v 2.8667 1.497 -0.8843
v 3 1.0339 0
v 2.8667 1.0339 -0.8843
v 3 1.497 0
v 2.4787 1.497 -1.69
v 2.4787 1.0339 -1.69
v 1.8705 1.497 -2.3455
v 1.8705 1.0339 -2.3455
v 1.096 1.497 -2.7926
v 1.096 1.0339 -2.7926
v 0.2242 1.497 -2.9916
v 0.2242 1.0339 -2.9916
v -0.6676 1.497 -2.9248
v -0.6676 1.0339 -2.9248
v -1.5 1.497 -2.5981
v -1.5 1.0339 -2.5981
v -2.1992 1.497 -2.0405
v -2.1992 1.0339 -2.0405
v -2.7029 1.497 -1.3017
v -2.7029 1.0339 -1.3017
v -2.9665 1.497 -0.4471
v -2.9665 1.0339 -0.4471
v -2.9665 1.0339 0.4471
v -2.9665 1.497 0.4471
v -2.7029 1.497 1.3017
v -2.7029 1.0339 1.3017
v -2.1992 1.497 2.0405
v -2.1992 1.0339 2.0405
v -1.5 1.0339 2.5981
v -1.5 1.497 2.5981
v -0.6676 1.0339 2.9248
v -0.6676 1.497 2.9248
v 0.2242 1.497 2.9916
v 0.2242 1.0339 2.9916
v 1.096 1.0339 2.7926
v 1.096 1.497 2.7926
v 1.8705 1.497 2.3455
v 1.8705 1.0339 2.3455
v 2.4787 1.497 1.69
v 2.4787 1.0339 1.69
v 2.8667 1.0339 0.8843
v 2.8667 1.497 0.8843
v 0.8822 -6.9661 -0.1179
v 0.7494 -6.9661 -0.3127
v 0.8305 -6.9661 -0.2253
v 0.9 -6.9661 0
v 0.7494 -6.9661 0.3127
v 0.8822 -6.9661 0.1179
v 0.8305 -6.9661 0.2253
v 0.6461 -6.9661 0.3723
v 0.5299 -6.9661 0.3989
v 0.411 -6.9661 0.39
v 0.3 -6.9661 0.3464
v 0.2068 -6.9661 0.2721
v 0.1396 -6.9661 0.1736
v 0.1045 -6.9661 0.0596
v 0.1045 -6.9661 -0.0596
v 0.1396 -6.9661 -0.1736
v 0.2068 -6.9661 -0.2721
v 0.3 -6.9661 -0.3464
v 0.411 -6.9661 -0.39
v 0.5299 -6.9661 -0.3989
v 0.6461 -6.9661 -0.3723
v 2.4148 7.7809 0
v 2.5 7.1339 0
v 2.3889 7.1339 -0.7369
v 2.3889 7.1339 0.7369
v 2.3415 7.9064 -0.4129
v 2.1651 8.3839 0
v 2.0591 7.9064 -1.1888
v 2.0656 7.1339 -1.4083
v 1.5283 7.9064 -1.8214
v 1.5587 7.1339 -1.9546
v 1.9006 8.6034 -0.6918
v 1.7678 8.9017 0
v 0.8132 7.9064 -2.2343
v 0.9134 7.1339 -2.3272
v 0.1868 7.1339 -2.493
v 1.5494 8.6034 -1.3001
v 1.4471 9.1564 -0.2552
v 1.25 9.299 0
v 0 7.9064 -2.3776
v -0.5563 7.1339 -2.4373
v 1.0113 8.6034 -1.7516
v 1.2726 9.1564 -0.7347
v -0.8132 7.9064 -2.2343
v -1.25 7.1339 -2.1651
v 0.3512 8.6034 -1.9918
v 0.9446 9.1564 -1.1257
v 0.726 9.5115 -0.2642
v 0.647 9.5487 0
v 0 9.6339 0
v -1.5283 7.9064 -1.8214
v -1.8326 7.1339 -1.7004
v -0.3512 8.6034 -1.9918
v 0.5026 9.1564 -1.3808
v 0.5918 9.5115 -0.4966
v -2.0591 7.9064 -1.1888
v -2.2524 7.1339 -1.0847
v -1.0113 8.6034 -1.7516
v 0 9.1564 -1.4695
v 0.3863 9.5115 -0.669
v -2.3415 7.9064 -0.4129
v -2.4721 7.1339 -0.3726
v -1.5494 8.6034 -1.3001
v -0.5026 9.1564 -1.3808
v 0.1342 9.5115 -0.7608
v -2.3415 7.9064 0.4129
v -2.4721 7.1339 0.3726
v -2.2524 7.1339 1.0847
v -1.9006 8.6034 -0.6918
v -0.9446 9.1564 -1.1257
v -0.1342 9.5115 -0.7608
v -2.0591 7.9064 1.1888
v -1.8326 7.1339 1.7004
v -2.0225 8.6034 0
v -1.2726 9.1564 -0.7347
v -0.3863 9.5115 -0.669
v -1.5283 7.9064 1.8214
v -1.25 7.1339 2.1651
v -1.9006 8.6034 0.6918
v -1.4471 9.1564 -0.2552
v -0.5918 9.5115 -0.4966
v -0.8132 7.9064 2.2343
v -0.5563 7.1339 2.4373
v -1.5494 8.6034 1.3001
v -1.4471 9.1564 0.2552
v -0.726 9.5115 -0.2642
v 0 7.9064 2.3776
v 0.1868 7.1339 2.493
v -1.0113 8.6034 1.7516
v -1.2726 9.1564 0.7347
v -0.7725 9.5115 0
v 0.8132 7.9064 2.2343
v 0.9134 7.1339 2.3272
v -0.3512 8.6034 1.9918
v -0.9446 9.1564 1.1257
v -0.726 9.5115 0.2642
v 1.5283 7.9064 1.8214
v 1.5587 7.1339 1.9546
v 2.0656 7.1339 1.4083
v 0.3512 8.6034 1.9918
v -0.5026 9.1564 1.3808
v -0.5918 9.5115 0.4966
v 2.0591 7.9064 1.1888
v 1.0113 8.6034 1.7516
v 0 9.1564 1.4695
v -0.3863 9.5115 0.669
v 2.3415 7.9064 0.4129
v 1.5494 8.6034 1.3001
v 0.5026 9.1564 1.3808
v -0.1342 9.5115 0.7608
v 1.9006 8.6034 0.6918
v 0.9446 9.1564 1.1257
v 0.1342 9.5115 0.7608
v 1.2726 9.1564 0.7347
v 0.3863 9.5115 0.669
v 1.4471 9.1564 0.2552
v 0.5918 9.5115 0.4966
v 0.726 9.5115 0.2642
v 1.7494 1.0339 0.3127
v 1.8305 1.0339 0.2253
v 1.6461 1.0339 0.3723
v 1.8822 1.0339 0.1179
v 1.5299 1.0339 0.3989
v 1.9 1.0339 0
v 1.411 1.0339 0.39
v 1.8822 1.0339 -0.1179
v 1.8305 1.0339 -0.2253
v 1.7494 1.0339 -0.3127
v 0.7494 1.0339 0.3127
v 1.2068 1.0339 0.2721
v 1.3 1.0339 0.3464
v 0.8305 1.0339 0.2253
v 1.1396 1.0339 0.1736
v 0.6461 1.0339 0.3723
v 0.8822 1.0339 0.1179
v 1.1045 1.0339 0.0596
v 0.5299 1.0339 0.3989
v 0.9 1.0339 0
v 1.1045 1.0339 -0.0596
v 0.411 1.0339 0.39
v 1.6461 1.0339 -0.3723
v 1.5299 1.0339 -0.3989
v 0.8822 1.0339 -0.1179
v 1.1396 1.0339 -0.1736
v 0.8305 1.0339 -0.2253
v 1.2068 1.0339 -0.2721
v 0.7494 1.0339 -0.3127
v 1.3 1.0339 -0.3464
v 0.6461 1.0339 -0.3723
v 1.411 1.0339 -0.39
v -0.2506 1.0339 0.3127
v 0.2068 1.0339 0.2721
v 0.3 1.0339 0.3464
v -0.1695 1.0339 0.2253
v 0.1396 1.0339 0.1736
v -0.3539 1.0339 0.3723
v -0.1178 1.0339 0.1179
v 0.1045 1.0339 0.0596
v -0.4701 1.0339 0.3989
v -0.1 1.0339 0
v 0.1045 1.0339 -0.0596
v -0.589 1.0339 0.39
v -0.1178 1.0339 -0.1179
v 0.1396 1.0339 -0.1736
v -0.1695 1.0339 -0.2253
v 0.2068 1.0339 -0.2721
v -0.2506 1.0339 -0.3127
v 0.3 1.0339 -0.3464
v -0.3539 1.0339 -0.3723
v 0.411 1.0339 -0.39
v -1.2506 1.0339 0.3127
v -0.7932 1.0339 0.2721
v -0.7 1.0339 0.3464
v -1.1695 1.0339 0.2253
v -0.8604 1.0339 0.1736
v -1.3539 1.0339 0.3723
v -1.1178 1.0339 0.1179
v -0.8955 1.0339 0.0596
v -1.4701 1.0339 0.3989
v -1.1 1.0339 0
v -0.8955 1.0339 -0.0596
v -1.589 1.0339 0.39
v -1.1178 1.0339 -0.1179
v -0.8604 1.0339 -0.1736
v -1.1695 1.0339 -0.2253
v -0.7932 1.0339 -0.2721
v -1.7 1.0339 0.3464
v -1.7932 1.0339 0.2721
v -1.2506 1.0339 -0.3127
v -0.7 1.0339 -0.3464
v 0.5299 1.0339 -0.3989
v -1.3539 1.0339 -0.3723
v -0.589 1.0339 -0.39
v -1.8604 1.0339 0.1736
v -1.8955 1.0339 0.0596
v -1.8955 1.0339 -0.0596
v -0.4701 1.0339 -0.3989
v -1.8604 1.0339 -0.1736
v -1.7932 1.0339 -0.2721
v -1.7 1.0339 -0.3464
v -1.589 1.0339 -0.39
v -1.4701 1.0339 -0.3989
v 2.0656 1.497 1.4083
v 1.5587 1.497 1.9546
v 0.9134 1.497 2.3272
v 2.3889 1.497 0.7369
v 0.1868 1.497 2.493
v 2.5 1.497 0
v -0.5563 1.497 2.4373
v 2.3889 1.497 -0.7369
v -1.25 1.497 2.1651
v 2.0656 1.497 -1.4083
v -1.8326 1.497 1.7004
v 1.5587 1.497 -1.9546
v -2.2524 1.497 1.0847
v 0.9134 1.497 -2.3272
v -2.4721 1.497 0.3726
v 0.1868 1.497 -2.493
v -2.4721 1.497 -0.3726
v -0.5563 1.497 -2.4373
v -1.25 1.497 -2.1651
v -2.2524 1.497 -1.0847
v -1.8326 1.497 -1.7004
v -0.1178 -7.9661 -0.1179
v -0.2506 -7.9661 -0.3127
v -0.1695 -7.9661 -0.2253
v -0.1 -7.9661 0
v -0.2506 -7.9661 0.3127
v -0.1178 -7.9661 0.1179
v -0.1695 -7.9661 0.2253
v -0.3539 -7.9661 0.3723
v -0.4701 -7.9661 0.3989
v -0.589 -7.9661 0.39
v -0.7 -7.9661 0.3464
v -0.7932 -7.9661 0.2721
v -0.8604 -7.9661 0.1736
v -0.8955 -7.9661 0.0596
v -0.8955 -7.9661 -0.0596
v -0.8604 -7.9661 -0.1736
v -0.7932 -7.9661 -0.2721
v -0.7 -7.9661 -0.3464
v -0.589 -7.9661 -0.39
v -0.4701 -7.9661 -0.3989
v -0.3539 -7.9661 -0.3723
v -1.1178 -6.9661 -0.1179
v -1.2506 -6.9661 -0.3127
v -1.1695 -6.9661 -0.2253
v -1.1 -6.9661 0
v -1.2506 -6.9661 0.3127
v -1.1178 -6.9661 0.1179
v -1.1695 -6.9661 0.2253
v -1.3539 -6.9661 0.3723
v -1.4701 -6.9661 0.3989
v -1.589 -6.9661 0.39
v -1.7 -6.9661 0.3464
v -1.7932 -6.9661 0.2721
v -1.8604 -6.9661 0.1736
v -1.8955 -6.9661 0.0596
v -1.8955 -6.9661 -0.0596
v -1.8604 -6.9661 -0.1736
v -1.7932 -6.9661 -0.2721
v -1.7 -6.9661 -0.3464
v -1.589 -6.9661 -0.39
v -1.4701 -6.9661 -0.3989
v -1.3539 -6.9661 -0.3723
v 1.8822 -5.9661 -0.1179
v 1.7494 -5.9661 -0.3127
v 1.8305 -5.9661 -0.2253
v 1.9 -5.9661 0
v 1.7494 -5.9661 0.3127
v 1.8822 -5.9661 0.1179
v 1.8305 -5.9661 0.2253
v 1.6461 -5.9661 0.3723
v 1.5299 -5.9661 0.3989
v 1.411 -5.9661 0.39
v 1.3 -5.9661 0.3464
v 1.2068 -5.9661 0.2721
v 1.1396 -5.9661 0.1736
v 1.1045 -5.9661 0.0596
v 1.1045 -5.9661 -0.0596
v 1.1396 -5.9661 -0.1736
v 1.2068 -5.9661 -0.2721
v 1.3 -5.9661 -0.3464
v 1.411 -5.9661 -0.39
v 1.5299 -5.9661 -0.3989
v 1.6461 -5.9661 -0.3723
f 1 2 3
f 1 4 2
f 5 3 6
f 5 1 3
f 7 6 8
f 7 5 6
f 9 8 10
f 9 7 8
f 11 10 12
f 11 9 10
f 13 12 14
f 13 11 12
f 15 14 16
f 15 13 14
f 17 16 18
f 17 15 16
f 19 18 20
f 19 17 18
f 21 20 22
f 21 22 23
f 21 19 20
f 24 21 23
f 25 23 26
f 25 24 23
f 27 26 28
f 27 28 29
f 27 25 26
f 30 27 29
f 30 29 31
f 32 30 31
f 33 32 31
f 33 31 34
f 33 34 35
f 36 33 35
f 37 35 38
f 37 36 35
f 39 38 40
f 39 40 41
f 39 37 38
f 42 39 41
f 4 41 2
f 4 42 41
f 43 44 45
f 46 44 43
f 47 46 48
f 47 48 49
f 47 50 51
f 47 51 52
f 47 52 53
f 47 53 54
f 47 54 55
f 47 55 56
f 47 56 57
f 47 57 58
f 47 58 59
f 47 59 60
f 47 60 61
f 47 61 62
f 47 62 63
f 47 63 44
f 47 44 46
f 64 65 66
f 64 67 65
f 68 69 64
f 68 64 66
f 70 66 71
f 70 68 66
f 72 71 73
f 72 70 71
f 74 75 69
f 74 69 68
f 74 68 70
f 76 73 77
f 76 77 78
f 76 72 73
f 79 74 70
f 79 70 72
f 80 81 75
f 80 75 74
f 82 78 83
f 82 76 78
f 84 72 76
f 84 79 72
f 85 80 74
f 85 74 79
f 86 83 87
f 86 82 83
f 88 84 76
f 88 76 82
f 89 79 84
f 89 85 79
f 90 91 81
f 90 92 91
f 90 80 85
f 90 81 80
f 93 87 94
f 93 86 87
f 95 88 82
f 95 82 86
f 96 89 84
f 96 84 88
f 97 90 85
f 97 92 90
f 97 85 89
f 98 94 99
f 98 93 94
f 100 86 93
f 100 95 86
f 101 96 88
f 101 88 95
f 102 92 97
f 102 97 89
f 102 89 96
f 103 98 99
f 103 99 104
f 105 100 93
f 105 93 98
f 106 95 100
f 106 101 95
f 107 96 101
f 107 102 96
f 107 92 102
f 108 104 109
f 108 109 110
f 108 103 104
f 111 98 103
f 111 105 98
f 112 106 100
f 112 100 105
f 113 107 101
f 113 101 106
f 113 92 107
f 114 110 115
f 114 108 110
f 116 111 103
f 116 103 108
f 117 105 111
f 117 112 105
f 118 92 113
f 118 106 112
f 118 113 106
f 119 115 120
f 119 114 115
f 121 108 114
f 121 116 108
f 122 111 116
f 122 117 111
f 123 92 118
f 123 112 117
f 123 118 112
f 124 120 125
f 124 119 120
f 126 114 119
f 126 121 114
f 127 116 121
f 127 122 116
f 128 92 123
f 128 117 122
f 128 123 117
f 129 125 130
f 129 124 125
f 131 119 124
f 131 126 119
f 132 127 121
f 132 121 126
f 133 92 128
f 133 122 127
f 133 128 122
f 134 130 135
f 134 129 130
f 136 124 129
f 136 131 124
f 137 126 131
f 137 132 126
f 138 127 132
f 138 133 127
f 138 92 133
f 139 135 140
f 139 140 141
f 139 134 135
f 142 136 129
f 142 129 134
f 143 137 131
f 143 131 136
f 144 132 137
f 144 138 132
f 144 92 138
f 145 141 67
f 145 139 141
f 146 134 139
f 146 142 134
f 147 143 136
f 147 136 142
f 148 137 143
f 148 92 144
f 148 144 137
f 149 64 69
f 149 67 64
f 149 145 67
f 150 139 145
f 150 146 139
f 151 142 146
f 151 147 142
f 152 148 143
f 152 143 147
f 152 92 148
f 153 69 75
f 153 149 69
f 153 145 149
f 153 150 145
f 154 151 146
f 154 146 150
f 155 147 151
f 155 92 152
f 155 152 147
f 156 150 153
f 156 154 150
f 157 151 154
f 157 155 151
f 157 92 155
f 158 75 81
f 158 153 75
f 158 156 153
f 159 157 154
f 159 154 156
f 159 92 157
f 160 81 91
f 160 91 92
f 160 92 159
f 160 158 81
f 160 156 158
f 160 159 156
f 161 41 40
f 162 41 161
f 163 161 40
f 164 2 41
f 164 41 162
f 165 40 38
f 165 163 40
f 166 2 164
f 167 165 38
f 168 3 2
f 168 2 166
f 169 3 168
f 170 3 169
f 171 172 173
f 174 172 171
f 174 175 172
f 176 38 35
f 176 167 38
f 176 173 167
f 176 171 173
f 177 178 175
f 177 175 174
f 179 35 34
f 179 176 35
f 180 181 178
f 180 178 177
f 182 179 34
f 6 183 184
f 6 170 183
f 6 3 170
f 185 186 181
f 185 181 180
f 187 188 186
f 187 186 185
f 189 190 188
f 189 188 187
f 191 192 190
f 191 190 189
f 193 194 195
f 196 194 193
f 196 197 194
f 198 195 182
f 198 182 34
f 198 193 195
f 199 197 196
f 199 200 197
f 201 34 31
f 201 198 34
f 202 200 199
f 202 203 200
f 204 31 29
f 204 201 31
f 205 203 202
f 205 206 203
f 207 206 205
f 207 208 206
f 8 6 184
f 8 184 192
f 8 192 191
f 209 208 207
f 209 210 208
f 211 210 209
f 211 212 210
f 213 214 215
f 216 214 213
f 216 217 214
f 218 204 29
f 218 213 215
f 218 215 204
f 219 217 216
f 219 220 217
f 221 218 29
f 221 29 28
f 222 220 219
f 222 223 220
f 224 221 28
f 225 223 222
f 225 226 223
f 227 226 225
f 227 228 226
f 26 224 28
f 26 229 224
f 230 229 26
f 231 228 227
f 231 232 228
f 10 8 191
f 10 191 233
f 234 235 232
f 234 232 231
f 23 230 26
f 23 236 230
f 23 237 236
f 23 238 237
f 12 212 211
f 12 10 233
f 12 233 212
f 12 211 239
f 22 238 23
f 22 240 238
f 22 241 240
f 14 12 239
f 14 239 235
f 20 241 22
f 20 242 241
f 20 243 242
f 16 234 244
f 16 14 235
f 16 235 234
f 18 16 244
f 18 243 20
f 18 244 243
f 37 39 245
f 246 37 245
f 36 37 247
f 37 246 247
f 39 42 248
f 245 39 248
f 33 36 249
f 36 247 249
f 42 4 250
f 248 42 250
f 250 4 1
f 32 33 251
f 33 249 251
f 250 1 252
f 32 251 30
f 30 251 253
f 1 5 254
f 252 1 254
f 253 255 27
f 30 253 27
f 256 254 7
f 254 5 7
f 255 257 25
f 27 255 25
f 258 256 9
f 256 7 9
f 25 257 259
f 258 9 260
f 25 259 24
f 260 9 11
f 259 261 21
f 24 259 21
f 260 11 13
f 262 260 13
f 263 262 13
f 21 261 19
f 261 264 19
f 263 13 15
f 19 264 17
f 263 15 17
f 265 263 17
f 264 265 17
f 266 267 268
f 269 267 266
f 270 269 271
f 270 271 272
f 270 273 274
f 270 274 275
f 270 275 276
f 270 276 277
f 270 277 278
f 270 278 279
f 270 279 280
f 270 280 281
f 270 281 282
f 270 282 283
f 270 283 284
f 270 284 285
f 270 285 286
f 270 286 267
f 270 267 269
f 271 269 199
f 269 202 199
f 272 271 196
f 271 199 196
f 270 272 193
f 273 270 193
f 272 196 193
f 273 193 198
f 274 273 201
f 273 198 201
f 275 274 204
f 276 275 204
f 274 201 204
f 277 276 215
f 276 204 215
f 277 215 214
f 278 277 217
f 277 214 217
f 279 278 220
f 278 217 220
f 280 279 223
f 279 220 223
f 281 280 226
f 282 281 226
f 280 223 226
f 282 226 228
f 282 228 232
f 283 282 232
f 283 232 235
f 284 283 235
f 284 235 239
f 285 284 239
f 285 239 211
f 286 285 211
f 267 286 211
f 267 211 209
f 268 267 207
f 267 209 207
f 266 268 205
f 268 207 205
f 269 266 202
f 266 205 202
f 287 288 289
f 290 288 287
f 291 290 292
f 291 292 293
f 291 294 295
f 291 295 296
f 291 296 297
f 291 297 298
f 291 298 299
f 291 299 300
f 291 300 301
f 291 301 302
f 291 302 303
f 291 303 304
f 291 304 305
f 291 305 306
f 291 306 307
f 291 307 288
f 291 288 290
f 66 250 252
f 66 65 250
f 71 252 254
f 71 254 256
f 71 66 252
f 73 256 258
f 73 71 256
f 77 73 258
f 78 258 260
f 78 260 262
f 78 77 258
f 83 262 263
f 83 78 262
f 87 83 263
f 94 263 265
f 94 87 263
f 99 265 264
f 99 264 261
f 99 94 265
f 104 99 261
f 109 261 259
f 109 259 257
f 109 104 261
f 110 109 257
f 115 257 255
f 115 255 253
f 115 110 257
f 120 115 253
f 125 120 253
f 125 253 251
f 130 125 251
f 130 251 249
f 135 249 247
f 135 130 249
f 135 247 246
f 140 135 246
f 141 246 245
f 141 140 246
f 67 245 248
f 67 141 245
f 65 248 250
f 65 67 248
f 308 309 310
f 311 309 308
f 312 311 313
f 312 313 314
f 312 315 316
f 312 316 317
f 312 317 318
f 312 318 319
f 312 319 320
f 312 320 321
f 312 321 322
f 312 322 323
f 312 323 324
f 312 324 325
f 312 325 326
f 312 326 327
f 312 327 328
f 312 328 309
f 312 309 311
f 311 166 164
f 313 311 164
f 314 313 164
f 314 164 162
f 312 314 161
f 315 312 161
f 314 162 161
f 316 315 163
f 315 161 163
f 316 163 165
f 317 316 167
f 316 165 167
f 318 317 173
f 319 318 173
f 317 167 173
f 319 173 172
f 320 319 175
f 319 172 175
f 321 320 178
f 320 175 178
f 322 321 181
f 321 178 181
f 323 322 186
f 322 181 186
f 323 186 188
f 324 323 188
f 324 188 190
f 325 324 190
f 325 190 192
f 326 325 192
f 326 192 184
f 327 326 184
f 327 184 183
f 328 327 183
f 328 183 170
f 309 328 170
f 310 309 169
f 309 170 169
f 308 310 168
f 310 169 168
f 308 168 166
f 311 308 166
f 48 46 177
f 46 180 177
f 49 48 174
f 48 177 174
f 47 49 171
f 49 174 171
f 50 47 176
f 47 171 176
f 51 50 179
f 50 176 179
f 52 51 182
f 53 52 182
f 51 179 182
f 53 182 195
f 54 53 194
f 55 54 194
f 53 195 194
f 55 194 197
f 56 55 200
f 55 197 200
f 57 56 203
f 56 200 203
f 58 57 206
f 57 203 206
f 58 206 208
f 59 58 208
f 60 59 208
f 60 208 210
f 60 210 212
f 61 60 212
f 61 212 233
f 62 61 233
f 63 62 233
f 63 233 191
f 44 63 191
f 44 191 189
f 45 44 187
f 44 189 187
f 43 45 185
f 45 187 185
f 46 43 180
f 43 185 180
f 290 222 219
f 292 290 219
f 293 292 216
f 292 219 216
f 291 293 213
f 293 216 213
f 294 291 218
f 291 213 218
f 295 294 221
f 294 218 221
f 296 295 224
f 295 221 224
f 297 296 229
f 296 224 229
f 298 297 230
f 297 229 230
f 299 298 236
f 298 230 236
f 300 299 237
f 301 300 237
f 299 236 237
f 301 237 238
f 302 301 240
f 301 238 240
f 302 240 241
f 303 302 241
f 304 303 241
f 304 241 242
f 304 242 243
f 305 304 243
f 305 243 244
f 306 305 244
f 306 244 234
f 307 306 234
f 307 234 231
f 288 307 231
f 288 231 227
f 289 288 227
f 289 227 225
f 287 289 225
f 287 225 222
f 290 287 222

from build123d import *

# Parameters (mm, degrees)
ESBO_O1_W                = 2.5
ESBO_O1_H                = 0.463123709
ESBO_O1_W_2              = 0.5
ESBO_O2_R                = 0.4
RESSALTO_EXTRUS_O1_DEPTH = 7
ESBO_O3_R                = 0.4
RESSALTO_EXTRUS_O2_DEPTH = 1
ESBO_O4_R                = 0.4
RESSALTO_EXTRUS_O3_DEPTH = 2


with BuildPart() as part:
    # Esboço1 → Revolução1 (revolve)
    with BuildSketch(Plane.XY):
        with BuildLine():
            Line((0, 7.133898305), (0, 4.633898305))
            ThreePointArc((0, 4.633898305), (1.767766953, 5.366131352), (2.5, 7.133898305))
            Line((2.5, 7.133898305), (0, 7.133898305))
        make_face()
        with BuildLine():
            Line((0, 9.633898305), (0, 7.133898305))
            Line((0, 7.133898305), (2.5, 7.133898305))
            ThreePointArc((2.5, 7.133898305), (1.767766953, 8.901665258), (0, 9.633898305))
        make_face()
        with BuildLine():
            Line((0, 7.133898305), (0, 4.633898305))
            ThreePointArc((0, 4.633898305), (1.767766953, 5.366131352), (2.5, 7.133898305))
            Line((2.5, 7.133898305), (0, 7.133898305))
        make_face()
        with BuildLine():
            Line((0, 9.633898305), (0, 7.133898305))
            Line((0, 7.133898305), (2.5, 7.133898305))
            ThreePointArc((2.5, 7.133898305), (1.767766953, 8.901665258), (0, 9.633898305))
        make_face()
        with BuildLine():
            Line((0, 4.633898305), (0, 1.497022014))
            Line((0, 1.497022014), (2.5, 1.497022014))
            Line((2.5, 1.497022014), (2.5, 7.133898305))
            ThreePointArc((2.5, 7.133898305), (1.767766953, 5.366131352), (0, 4.633898305))
        make_face()
        with Locations((1.25, 1.26546016)):
            Rectangle(ESBO_O1_W, ESBO_O1_H)
        with Locations((2.75, 1.26546016)):
            Rectangle(ESBO_O1_W_2, ESBO_O1_H)
    revolve(axis=Axis((0, 1.033898305, 0), (0, 1, 0)))

    # Esboço2 → Ressalto-extrusão1 (add)
    with BuildSketch(Plane.XZ.offset(-1.033898305)):
        with Locations((-1.5, 0)):
            Circle(ESBO_O2_R)
        with Locations((-0.5, 0)):
            Circle(ESBO_O2_R)
        with Locations((0.5, 0)):
            Circle(ESBO_O2_R)
        with Locations((1.5, 0)):
            Circle(ESBO_O2_R)
    extrude(amount=RESSALTO_EXTRUS_O1_DEPTH)

    # Esboço3 → Ressalto-extrusão2 (add)
    with BuildSketch(Plane.XZ.offset(5.966101695)):
        with Locations((0.5, 0)):
            Circle(ESBO_O3_R)
        with Locations((-1.5, 0)):
            Circle(ESBO_O3_R)
    extrude(amount=RESSALTO_EXTRUS_O2_DEPTH)

    # Esboço4 → Ressalto-extrusão3 (add)
    with BuildSketch(Plane.XZ.offset(5.966101695)):
        with Locations((-0.5, 0)):
            Circle(ESBO_O4_R)
    extrude(amount=RESSALTO_EXTRUS_O3_DEPTH)


solid = part.part
